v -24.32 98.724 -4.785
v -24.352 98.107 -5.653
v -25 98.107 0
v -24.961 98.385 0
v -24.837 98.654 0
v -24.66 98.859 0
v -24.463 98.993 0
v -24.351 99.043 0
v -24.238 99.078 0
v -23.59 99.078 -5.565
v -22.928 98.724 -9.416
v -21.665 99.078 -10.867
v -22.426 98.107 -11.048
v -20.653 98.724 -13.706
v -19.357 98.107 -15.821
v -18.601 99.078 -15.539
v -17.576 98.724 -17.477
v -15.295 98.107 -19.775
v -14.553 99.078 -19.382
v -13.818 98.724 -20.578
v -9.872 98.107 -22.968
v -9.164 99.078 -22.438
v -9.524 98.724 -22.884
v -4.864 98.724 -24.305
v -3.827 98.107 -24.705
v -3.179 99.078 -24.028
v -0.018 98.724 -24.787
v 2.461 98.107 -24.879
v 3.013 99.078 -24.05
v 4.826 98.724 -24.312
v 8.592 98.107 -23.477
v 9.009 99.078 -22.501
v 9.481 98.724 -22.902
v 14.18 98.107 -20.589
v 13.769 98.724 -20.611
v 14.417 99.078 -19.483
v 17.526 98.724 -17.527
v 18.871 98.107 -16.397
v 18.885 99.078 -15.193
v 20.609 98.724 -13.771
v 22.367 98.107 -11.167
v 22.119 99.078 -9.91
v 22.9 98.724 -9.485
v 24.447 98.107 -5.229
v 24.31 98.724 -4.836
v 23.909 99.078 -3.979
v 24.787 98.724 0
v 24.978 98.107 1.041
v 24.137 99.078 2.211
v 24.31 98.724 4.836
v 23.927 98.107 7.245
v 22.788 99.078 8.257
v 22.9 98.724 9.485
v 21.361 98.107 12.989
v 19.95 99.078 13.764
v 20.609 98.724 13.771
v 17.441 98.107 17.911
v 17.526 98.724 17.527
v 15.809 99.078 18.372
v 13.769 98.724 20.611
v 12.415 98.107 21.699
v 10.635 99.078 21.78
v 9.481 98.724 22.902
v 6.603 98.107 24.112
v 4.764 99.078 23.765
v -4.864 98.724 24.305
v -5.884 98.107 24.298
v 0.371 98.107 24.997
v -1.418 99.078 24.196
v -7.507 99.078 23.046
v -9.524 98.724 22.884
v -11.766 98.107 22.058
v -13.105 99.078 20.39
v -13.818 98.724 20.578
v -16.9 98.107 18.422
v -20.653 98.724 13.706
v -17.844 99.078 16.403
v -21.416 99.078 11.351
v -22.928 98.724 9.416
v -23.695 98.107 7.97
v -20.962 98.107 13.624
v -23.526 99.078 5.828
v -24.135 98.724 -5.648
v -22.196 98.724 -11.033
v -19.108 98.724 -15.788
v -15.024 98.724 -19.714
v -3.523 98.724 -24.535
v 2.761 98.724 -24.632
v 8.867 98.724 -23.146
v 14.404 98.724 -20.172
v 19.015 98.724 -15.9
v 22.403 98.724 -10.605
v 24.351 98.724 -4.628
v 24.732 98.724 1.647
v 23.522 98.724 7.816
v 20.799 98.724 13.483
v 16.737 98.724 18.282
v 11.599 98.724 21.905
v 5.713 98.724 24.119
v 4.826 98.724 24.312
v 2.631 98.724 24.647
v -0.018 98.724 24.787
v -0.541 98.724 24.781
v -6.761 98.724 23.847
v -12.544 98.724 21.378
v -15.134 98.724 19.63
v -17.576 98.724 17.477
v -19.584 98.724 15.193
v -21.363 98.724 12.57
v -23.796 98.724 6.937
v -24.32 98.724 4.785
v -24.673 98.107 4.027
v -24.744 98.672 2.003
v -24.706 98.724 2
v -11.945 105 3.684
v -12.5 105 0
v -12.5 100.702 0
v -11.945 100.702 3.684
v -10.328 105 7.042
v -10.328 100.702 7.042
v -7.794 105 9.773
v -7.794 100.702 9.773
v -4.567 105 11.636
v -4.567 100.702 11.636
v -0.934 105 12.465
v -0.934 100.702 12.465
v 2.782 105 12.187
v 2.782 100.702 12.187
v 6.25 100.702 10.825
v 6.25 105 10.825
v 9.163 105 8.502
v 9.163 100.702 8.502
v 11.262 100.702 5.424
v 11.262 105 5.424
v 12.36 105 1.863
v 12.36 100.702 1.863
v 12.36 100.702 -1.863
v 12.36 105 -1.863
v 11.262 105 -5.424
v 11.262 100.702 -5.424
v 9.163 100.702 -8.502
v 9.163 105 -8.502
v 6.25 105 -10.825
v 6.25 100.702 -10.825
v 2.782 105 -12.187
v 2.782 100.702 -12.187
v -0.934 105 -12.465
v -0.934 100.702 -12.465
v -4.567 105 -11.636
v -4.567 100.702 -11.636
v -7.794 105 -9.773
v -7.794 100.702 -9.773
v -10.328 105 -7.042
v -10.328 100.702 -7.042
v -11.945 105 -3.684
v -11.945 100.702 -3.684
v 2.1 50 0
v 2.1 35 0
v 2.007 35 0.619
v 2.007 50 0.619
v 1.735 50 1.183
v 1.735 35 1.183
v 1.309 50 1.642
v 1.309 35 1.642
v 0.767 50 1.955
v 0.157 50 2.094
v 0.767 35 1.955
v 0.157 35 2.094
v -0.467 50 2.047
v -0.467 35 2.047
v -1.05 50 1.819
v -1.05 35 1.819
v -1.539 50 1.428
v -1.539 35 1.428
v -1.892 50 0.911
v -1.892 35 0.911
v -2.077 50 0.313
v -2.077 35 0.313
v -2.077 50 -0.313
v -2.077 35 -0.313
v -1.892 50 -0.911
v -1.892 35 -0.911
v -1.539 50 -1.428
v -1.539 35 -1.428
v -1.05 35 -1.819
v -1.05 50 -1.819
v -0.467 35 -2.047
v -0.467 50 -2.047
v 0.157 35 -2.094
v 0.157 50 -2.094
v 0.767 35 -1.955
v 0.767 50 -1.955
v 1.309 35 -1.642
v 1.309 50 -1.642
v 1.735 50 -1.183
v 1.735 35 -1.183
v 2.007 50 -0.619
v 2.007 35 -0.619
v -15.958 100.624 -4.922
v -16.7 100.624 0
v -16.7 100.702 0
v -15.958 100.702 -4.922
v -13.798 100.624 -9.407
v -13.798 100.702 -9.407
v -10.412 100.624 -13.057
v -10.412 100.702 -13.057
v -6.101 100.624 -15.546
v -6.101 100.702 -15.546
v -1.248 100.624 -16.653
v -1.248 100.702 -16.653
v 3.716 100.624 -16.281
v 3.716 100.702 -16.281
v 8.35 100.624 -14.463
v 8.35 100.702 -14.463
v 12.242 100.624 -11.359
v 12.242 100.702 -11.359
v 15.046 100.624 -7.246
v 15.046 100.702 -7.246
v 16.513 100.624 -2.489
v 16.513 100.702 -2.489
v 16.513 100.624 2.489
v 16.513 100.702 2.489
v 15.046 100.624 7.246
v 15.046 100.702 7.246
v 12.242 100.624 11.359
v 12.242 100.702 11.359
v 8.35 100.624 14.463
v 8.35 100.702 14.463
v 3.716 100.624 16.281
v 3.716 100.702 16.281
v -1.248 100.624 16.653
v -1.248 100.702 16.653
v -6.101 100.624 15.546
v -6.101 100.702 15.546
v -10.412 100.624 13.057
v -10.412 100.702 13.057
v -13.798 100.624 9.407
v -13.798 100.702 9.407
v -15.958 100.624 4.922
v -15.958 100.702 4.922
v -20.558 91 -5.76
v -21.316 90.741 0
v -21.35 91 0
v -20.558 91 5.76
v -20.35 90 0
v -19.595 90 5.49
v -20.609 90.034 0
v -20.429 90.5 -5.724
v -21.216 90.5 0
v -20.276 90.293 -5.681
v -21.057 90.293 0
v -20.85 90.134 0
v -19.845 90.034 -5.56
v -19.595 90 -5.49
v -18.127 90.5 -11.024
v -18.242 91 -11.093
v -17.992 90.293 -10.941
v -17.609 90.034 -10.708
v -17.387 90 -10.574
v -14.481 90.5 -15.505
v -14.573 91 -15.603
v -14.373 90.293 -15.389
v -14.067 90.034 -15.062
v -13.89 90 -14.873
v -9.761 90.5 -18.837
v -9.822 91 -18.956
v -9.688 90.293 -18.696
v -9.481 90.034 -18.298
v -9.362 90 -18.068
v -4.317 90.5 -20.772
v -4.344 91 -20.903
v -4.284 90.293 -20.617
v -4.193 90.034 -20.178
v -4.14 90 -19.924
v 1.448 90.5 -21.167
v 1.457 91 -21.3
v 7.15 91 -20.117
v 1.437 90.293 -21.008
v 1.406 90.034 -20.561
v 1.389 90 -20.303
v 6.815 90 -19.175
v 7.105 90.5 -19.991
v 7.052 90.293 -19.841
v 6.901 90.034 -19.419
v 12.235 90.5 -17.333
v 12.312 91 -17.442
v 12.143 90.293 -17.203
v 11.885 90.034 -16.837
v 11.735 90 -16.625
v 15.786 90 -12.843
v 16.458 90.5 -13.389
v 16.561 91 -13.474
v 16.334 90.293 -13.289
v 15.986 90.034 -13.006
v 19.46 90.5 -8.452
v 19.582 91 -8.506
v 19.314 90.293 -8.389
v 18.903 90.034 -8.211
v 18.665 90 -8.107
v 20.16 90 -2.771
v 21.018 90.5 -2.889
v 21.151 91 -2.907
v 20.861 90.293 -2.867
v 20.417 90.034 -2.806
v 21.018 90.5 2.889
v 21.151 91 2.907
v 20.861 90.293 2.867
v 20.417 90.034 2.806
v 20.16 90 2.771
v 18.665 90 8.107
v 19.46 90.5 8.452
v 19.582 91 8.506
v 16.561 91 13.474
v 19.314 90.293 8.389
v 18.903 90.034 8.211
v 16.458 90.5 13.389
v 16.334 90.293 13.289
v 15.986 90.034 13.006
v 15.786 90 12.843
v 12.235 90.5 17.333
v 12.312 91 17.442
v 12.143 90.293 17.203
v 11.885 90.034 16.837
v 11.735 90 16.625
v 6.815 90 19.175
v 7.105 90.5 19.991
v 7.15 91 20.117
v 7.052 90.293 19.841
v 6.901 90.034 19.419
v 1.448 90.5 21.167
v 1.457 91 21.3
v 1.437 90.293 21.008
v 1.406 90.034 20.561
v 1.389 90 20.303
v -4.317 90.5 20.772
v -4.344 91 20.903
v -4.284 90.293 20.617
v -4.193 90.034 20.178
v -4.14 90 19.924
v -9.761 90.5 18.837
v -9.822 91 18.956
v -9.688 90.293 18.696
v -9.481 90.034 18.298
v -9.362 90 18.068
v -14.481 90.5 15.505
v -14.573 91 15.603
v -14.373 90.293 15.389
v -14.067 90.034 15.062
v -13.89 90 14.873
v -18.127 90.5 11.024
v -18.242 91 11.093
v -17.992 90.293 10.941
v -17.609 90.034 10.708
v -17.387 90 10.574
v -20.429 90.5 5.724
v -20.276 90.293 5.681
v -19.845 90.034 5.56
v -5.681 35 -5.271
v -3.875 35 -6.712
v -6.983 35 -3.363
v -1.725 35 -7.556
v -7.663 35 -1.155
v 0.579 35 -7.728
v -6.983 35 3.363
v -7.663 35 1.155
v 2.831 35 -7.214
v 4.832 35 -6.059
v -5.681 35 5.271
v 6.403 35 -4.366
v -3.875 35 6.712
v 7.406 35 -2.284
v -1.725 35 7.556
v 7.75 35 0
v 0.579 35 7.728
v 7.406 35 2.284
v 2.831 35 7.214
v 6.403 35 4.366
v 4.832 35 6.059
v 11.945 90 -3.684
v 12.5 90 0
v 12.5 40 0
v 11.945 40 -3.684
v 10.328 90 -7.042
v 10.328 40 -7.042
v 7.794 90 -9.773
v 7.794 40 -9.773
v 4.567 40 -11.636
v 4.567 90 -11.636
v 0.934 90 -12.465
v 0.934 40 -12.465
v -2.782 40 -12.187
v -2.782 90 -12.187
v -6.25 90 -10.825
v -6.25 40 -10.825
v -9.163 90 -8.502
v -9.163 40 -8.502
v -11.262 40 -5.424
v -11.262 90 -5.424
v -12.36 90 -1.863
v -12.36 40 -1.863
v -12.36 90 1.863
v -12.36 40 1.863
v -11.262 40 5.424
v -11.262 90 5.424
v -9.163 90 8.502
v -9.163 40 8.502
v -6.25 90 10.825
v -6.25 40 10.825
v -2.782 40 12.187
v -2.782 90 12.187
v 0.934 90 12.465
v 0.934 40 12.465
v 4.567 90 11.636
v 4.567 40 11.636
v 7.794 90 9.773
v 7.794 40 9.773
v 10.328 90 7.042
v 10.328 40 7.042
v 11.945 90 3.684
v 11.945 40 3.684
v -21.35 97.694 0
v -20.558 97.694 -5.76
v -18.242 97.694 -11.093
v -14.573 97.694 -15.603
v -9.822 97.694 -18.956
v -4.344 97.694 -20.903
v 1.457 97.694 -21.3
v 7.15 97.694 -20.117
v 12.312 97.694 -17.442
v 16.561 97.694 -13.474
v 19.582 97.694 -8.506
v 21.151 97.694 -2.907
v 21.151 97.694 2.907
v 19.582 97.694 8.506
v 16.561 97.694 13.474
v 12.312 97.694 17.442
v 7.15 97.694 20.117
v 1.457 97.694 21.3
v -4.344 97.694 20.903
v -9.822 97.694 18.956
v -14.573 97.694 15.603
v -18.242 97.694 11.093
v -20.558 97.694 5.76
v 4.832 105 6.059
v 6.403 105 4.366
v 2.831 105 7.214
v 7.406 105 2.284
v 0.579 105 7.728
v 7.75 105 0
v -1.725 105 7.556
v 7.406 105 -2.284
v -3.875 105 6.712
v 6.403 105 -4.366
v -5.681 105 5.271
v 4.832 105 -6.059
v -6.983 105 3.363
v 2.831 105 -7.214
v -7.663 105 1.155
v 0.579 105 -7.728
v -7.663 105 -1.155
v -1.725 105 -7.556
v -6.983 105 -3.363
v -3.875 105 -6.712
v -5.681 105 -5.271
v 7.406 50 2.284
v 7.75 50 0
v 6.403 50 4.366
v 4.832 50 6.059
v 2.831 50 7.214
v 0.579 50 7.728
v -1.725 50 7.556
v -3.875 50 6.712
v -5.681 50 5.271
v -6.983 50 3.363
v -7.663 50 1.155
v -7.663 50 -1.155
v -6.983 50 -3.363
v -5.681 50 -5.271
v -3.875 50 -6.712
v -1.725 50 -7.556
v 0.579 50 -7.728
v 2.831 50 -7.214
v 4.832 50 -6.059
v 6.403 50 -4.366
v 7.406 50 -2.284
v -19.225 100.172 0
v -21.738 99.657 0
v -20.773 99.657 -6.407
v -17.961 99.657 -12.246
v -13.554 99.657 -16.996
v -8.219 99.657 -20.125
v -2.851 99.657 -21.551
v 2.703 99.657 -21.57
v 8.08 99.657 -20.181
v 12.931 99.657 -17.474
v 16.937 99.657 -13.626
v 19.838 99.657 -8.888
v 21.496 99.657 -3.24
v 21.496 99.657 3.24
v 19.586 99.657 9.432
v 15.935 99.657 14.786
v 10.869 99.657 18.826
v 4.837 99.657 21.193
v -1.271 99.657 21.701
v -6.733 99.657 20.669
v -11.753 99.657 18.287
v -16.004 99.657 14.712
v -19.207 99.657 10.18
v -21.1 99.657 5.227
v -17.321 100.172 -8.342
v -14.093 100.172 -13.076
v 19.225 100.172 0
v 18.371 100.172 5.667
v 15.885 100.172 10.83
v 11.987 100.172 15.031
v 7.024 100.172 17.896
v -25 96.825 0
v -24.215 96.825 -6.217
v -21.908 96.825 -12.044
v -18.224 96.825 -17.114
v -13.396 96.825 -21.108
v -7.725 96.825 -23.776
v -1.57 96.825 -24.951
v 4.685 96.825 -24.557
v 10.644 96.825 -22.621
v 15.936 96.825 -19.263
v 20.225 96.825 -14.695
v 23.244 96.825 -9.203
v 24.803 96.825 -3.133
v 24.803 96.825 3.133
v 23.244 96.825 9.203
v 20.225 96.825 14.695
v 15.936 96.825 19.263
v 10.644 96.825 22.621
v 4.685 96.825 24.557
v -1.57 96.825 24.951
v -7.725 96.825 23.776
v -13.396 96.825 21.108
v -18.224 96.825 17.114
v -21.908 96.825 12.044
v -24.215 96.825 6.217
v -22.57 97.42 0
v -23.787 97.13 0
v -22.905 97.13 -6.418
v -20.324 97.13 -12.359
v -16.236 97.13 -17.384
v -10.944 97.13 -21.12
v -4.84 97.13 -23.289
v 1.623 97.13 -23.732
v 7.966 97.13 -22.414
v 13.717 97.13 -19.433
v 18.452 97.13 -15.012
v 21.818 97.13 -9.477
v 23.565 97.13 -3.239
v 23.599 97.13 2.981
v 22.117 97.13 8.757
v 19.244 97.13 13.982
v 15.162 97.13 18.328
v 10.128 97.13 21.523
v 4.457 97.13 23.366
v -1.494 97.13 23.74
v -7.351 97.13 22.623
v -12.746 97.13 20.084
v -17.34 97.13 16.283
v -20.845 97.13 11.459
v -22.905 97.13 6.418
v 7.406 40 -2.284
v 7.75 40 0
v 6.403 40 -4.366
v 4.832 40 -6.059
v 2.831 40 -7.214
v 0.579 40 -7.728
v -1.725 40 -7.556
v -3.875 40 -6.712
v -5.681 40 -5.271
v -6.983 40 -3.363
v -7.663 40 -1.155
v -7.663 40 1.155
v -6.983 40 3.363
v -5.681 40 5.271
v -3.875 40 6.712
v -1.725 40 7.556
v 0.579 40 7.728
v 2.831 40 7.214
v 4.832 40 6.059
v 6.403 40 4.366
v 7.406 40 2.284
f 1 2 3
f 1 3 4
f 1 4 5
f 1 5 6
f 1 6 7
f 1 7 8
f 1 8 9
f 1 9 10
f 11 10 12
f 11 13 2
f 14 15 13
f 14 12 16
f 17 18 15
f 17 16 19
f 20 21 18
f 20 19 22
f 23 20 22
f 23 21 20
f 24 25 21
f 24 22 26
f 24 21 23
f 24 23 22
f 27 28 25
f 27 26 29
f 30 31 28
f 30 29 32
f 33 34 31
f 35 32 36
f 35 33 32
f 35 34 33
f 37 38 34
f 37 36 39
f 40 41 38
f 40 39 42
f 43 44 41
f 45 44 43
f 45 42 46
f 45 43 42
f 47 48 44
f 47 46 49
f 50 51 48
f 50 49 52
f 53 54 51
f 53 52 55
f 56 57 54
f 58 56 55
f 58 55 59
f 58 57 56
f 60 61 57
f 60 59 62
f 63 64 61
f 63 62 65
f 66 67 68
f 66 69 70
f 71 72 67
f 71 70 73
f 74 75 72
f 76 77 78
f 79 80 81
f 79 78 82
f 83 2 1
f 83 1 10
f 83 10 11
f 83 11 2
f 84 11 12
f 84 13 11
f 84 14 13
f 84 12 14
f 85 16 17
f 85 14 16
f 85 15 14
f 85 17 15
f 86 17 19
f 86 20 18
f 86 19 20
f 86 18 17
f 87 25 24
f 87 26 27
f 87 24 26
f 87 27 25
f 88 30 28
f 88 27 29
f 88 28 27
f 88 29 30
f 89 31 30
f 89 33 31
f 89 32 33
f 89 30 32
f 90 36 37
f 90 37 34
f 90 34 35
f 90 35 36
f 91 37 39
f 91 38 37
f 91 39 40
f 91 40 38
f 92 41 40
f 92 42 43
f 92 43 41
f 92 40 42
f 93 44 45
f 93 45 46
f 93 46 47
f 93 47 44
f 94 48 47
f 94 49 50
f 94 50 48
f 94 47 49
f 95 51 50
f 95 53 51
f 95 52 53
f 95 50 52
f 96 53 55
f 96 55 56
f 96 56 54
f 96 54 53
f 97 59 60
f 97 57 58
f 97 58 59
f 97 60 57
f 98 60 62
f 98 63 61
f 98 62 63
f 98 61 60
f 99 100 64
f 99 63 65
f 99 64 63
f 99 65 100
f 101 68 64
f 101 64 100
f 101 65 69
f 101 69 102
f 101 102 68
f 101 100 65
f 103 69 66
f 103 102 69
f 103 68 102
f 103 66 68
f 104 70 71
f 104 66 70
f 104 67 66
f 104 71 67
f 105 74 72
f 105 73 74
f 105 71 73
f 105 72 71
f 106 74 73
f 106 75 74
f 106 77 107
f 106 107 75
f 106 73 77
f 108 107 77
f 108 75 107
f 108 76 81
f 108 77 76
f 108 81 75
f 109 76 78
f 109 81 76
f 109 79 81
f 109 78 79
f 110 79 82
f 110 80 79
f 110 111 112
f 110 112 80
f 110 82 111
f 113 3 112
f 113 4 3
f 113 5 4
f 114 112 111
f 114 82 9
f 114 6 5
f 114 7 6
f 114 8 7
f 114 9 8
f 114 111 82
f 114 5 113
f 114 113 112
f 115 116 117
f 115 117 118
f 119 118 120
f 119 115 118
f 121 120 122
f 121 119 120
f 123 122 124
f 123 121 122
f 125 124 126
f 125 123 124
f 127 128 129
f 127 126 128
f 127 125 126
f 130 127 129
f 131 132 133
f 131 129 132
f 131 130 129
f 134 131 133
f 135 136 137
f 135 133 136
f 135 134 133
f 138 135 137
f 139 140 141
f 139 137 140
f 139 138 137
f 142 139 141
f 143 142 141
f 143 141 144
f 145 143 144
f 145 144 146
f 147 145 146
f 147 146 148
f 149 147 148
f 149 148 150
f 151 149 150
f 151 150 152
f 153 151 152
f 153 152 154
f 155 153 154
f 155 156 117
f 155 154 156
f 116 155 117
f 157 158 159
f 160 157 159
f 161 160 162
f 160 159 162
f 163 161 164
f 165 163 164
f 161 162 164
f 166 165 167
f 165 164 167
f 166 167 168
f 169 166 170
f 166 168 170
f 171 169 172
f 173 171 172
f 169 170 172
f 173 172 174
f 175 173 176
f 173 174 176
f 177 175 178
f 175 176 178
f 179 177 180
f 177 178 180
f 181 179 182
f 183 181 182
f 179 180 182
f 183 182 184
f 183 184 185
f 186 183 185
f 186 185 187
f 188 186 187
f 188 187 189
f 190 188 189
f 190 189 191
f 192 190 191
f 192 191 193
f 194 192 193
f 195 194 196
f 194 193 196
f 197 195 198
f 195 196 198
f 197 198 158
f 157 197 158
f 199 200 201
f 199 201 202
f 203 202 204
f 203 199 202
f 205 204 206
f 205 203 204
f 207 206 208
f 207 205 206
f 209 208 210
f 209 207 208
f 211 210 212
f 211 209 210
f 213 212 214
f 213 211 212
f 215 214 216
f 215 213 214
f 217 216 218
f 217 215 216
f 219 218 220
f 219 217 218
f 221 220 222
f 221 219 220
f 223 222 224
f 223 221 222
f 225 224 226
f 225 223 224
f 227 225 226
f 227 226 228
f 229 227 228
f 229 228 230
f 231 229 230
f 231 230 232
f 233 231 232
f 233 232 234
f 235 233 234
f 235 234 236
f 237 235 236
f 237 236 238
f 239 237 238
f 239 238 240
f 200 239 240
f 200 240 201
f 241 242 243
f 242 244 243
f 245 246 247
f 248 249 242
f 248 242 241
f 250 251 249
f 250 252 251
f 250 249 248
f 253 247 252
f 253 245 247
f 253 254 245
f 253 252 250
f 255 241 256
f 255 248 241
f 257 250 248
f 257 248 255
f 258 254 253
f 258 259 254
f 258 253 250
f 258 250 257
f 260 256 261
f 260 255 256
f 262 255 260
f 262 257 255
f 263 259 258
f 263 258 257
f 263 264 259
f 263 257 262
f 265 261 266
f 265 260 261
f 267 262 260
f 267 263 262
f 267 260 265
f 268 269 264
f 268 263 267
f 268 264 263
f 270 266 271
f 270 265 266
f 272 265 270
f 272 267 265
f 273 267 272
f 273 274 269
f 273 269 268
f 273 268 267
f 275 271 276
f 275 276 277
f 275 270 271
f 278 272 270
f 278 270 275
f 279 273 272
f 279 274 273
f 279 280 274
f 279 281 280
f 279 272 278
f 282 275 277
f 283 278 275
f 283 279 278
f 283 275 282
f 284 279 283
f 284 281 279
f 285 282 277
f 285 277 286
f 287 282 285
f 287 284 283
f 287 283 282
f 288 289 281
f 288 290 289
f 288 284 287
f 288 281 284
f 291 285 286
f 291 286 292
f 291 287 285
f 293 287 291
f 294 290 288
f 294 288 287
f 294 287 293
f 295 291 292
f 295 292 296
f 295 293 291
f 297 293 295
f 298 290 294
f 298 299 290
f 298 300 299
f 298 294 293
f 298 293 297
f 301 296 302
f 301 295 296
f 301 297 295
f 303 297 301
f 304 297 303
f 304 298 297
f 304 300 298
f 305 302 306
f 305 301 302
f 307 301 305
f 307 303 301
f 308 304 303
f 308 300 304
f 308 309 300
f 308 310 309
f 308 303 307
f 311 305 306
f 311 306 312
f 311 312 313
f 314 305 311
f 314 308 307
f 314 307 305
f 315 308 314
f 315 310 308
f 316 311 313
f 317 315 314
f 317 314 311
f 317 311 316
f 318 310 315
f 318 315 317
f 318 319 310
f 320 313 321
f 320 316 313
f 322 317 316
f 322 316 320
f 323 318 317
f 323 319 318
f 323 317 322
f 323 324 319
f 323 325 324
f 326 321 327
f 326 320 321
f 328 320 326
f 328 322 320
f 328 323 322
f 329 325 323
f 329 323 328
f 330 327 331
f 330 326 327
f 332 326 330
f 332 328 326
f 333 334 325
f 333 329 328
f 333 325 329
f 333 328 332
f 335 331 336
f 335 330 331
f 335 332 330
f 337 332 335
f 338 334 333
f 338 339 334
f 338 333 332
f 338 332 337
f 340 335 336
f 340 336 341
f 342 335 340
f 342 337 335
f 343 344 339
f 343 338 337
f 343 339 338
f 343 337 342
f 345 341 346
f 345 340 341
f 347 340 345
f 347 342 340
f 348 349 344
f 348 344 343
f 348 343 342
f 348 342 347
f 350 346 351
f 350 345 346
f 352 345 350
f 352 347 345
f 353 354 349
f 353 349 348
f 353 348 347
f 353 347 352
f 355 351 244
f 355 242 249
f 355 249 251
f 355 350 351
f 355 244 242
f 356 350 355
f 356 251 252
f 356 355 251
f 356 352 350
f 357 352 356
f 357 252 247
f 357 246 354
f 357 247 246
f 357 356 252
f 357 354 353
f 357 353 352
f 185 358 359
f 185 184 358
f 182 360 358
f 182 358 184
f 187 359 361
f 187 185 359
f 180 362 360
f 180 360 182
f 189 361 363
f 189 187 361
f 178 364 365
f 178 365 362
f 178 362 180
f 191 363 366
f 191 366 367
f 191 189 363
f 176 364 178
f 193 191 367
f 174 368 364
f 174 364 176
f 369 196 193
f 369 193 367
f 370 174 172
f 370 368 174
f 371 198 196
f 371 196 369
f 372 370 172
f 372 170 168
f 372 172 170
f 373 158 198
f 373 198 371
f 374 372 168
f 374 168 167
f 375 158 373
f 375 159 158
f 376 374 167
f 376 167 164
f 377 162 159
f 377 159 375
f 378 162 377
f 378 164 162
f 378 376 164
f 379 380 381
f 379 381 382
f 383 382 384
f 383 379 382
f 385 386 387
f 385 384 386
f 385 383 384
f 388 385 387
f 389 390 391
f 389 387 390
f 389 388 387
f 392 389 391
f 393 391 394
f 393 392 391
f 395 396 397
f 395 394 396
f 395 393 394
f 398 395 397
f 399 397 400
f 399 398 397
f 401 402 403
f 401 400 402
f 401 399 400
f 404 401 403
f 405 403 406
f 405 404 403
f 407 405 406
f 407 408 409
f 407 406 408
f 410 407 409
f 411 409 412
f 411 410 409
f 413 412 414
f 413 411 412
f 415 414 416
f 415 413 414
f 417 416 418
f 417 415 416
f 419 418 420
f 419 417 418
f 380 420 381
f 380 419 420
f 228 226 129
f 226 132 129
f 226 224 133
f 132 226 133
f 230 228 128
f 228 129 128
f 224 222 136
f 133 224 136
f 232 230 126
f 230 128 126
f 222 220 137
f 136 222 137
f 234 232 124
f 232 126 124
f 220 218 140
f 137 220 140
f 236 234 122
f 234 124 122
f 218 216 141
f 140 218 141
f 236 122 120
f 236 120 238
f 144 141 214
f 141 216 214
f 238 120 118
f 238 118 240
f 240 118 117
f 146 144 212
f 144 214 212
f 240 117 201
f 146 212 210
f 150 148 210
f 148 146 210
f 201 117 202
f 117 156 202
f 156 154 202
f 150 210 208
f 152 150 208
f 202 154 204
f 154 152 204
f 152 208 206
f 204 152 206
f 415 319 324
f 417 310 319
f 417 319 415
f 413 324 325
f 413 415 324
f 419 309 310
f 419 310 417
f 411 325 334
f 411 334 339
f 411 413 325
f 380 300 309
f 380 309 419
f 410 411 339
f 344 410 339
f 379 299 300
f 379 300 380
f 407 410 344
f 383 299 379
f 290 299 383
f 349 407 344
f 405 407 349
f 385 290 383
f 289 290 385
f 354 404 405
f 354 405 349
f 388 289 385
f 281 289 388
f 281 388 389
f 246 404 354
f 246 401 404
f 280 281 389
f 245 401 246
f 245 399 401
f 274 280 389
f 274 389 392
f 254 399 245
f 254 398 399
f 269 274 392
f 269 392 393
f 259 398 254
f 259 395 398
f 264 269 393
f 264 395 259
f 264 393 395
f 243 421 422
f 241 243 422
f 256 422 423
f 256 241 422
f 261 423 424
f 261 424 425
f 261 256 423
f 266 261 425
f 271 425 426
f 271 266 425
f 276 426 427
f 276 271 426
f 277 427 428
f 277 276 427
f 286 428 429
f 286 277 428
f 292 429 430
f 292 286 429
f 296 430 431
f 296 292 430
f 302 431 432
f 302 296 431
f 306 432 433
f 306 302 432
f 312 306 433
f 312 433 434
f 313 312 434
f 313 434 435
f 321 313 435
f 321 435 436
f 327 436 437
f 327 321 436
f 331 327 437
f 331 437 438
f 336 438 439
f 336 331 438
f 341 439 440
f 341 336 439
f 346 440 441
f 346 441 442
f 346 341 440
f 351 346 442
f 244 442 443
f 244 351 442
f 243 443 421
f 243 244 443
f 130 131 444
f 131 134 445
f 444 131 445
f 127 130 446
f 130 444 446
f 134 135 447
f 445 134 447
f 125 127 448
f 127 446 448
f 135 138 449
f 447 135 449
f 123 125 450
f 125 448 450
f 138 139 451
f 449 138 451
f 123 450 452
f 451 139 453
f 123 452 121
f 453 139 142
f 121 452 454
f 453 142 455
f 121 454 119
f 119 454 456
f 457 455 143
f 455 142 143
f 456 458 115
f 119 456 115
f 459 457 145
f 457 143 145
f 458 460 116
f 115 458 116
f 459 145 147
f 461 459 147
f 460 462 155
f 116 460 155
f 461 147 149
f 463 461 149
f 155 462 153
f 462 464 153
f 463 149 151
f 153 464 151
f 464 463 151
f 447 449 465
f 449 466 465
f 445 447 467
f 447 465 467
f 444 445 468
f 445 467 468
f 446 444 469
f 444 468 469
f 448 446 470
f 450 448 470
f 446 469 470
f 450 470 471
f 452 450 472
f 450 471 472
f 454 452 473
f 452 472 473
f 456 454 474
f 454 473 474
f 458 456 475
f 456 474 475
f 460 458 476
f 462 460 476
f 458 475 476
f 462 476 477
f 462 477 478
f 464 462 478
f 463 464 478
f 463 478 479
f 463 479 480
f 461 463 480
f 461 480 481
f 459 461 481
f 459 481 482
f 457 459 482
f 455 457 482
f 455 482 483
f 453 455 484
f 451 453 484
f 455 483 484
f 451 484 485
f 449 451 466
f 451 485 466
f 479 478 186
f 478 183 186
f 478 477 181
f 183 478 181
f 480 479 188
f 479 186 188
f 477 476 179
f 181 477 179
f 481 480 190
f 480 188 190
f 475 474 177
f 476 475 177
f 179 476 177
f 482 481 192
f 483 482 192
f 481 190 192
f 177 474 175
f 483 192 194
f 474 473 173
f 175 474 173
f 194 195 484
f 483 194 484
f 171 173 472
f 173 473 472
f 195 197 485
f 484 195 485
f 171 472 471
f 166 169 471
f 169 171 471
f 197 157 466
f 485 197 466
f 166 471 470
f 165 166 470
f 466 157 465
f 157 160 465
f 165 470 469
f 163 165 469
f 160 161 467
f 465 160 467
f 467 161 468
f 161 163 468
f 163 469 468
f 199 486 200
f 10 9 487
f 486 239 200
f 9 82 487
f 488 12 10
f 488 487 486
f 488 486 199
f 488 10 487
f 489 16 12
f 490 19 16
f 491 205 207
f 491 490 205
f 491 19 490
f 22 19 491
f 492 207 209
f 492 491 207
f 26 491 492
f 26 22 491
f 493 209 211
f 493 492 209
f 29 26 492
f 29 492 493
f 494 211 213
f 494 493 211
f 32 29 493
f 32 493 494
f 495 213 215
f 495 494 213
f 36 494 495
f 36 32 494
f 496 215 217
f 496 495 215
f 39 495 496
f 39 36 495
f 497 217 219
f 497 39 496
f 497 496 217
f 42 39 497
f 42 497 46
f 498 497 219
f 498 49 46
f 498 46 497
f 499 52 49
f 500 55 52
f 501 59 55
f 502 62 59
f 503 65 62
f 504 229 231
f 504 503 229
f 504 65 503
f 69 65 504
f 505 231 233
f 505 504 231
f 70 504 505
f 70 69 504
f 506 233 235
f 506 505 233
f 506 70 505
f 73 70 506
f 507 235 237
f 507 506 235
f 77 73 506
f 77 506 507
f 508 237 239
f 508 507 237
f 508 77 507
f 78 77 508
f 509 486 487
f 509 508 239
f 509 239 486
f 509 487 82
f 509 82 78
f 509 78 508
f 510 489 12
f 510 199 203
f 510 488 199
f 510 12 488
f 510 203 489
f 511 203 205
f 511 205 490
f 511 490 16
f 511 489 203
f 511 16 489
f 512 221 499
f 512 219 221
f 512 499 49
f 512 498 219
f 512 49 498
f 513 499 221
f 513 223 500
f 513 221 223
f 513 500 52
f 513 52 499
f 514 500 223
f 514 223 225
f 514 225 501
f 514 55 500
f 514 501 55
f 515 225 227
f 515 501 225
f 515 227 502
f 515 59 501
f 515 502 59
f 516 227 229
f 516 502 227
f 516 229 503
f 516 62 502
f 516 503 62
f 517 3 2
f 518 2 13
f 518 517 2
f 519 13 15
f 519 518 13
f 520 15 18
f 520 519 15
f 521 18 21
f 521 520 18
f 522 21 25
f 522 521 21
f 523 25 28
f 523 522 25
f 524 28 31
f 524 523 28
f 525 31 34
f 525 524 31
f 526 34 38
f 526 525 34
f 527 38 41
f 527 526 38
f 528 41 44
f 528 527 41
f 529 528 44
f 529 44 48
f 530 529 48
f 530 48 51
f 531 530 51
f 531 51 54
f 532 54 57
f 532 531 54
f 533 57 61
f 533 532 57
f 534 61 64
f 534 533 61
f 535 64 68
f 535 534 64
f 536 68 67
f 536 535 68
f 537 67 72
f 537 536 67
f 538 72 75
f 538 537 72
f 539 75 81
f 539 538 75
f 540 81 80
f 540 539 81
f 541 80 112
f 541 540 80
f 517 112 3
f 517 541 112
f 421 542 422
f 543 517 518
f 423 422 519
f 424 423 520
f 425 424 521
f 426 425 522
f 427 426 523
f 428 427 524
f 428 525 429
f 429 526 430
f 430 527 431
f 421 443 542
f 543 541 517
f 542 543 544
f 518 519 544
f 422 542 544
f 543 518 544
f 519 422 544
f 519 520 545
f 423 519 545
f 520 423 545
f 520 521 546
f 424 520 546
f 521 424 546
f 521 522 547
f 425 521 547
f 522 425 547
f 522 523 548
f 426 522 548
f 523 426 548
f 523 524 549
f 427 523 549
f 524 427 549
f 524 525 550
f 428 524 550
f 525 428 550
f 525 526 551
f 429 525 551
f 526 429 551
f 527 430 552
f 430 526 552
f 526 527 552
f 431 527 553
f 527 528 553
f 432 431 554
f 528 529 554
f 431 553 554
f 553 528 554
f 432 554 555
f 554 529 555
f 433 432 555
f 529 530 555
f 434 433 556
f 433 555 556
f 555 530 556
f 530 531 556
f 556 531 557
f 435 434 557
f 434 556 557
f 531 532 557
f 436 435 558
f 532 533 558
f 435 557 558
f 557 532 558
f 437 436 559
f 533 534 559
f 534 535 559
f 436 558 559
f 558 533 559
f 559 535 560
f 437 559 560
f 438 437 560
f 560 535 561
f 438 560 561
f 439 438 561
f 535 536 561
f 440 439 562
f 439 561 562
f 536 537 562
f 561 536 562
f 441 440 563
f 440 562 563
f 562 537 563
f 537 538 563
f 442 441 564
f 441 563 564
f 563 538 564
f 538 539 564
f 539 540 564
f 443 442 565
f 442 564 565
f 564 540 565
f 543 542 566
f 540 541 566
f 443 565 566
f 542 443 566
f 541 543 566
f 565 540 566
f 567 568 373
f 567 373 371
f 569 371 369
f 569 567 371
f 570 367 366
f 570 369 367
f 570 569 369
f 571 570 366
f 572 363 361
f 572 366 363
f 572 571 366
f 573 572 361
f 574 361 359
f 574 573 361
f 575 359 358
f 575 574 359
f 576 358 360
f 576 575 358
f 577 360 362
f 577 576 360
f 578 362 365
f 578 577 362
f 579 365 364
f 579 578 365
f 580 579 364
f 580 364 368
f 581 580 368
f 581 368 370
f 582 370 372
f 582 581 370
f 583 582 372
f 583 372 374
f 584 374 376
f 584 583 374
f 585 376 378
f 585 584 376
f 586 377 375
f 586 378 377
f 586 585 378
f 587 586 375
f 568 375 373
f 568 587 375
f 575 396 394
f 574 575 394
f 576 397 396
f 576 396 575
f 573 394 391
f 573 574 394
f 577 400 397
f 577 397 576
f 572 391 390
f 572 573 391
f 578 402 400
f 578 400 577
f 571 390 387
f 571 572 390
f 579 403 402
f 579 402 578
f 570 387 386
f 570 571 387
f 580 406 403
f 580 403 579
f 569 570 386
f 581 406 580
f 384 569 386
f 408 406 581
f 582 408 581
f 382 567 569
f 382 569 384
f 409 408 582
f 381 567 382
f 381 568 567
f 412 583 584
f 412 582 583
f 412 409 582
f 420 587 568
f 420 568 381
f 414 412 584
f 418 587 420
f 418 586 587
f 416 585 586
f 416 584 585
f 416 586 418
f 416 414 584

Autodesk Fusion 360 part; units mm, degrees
sketch "Sketch13" plane through (0, 0, 0) normal (0, 0, 1) x (1, 0, 0)
  line L0 (0, 105) -> (0, 100)
  arc A0 (-16.7, 100.6236) -> (-25, 98.8888) centre (0, 0) ccw
  line L1 (-25, 98.8888) -> (-25, 96.8246)
  arc A1 (-21.35, 97.6943) -> (-25, 96.8246) centre (0, 0) ccw
  line L2 (0, 90) -> (0, 100)
  line L3 (-21.35, 97.6943) -> (-21.35, 90)
  line L4 (0, 90) -> (0, 100)
  line L5 (-16.7, 100.7023) -> (-16.7, 100.6236)
  line L6 (0, 90) -> (-21.35, 90)
  line L7 (0, 105) -> (-12.5, 105)
  line L8 (-16.7, 100.7023) -> (-12.5, 100.7023)
  line L9 (-12.5, 100.7023) -> (-12.5, 105)
  dimension "d41" = 200
  dimension "d42" = 204
  dimension "d54" = 10
  dimension "d66" = 12.5
revolve "Revolve4" add sketch "Sketch13" angle 360 about axis through (0, 105, 0) along (0, -1, 0)
fillet "Fillet2" radius 1 1 edges at (-23.3082, 98.8888, 9.0404)
fillet "Fillet3" radius 1 1 edges at (-19.9052, 90, 7.7205)
sketch "Sketch16" plane through (0, 90, 0) normal (0, -1, 0) x (1, 0, 0)
  circle A0 centre (0, 0) radius 20.35
  circle A1 centre (0, 0) radius 7.75
  circle A2 centre (0, 0) radius 12.5
  dimension "d69" = 15.5
  dimension "d72" = 25
extrude "Extrude7" cut sketch "Sketch16" against normal blind 30 contours A1
extrude "Extrude8" add sketch "Sketch16" along normal blind 50 contours A2
extrude "Extrude9" add sketch "Sketch16" along normal blind 55 and the other way blind -40 contours A1
sketch "Sketch18" plane through (0, 35, 0) normal (0, -1, 0) x (1, 0, 0)
  circle A0 centre (0, 0) radius 7.75
  circle A1 centre (0, 0) radius 2.1
  dimension "d80" = 4.2
extrude "Extrude10" cut sketch "Sketch18" against normal blind 86 contours A1
